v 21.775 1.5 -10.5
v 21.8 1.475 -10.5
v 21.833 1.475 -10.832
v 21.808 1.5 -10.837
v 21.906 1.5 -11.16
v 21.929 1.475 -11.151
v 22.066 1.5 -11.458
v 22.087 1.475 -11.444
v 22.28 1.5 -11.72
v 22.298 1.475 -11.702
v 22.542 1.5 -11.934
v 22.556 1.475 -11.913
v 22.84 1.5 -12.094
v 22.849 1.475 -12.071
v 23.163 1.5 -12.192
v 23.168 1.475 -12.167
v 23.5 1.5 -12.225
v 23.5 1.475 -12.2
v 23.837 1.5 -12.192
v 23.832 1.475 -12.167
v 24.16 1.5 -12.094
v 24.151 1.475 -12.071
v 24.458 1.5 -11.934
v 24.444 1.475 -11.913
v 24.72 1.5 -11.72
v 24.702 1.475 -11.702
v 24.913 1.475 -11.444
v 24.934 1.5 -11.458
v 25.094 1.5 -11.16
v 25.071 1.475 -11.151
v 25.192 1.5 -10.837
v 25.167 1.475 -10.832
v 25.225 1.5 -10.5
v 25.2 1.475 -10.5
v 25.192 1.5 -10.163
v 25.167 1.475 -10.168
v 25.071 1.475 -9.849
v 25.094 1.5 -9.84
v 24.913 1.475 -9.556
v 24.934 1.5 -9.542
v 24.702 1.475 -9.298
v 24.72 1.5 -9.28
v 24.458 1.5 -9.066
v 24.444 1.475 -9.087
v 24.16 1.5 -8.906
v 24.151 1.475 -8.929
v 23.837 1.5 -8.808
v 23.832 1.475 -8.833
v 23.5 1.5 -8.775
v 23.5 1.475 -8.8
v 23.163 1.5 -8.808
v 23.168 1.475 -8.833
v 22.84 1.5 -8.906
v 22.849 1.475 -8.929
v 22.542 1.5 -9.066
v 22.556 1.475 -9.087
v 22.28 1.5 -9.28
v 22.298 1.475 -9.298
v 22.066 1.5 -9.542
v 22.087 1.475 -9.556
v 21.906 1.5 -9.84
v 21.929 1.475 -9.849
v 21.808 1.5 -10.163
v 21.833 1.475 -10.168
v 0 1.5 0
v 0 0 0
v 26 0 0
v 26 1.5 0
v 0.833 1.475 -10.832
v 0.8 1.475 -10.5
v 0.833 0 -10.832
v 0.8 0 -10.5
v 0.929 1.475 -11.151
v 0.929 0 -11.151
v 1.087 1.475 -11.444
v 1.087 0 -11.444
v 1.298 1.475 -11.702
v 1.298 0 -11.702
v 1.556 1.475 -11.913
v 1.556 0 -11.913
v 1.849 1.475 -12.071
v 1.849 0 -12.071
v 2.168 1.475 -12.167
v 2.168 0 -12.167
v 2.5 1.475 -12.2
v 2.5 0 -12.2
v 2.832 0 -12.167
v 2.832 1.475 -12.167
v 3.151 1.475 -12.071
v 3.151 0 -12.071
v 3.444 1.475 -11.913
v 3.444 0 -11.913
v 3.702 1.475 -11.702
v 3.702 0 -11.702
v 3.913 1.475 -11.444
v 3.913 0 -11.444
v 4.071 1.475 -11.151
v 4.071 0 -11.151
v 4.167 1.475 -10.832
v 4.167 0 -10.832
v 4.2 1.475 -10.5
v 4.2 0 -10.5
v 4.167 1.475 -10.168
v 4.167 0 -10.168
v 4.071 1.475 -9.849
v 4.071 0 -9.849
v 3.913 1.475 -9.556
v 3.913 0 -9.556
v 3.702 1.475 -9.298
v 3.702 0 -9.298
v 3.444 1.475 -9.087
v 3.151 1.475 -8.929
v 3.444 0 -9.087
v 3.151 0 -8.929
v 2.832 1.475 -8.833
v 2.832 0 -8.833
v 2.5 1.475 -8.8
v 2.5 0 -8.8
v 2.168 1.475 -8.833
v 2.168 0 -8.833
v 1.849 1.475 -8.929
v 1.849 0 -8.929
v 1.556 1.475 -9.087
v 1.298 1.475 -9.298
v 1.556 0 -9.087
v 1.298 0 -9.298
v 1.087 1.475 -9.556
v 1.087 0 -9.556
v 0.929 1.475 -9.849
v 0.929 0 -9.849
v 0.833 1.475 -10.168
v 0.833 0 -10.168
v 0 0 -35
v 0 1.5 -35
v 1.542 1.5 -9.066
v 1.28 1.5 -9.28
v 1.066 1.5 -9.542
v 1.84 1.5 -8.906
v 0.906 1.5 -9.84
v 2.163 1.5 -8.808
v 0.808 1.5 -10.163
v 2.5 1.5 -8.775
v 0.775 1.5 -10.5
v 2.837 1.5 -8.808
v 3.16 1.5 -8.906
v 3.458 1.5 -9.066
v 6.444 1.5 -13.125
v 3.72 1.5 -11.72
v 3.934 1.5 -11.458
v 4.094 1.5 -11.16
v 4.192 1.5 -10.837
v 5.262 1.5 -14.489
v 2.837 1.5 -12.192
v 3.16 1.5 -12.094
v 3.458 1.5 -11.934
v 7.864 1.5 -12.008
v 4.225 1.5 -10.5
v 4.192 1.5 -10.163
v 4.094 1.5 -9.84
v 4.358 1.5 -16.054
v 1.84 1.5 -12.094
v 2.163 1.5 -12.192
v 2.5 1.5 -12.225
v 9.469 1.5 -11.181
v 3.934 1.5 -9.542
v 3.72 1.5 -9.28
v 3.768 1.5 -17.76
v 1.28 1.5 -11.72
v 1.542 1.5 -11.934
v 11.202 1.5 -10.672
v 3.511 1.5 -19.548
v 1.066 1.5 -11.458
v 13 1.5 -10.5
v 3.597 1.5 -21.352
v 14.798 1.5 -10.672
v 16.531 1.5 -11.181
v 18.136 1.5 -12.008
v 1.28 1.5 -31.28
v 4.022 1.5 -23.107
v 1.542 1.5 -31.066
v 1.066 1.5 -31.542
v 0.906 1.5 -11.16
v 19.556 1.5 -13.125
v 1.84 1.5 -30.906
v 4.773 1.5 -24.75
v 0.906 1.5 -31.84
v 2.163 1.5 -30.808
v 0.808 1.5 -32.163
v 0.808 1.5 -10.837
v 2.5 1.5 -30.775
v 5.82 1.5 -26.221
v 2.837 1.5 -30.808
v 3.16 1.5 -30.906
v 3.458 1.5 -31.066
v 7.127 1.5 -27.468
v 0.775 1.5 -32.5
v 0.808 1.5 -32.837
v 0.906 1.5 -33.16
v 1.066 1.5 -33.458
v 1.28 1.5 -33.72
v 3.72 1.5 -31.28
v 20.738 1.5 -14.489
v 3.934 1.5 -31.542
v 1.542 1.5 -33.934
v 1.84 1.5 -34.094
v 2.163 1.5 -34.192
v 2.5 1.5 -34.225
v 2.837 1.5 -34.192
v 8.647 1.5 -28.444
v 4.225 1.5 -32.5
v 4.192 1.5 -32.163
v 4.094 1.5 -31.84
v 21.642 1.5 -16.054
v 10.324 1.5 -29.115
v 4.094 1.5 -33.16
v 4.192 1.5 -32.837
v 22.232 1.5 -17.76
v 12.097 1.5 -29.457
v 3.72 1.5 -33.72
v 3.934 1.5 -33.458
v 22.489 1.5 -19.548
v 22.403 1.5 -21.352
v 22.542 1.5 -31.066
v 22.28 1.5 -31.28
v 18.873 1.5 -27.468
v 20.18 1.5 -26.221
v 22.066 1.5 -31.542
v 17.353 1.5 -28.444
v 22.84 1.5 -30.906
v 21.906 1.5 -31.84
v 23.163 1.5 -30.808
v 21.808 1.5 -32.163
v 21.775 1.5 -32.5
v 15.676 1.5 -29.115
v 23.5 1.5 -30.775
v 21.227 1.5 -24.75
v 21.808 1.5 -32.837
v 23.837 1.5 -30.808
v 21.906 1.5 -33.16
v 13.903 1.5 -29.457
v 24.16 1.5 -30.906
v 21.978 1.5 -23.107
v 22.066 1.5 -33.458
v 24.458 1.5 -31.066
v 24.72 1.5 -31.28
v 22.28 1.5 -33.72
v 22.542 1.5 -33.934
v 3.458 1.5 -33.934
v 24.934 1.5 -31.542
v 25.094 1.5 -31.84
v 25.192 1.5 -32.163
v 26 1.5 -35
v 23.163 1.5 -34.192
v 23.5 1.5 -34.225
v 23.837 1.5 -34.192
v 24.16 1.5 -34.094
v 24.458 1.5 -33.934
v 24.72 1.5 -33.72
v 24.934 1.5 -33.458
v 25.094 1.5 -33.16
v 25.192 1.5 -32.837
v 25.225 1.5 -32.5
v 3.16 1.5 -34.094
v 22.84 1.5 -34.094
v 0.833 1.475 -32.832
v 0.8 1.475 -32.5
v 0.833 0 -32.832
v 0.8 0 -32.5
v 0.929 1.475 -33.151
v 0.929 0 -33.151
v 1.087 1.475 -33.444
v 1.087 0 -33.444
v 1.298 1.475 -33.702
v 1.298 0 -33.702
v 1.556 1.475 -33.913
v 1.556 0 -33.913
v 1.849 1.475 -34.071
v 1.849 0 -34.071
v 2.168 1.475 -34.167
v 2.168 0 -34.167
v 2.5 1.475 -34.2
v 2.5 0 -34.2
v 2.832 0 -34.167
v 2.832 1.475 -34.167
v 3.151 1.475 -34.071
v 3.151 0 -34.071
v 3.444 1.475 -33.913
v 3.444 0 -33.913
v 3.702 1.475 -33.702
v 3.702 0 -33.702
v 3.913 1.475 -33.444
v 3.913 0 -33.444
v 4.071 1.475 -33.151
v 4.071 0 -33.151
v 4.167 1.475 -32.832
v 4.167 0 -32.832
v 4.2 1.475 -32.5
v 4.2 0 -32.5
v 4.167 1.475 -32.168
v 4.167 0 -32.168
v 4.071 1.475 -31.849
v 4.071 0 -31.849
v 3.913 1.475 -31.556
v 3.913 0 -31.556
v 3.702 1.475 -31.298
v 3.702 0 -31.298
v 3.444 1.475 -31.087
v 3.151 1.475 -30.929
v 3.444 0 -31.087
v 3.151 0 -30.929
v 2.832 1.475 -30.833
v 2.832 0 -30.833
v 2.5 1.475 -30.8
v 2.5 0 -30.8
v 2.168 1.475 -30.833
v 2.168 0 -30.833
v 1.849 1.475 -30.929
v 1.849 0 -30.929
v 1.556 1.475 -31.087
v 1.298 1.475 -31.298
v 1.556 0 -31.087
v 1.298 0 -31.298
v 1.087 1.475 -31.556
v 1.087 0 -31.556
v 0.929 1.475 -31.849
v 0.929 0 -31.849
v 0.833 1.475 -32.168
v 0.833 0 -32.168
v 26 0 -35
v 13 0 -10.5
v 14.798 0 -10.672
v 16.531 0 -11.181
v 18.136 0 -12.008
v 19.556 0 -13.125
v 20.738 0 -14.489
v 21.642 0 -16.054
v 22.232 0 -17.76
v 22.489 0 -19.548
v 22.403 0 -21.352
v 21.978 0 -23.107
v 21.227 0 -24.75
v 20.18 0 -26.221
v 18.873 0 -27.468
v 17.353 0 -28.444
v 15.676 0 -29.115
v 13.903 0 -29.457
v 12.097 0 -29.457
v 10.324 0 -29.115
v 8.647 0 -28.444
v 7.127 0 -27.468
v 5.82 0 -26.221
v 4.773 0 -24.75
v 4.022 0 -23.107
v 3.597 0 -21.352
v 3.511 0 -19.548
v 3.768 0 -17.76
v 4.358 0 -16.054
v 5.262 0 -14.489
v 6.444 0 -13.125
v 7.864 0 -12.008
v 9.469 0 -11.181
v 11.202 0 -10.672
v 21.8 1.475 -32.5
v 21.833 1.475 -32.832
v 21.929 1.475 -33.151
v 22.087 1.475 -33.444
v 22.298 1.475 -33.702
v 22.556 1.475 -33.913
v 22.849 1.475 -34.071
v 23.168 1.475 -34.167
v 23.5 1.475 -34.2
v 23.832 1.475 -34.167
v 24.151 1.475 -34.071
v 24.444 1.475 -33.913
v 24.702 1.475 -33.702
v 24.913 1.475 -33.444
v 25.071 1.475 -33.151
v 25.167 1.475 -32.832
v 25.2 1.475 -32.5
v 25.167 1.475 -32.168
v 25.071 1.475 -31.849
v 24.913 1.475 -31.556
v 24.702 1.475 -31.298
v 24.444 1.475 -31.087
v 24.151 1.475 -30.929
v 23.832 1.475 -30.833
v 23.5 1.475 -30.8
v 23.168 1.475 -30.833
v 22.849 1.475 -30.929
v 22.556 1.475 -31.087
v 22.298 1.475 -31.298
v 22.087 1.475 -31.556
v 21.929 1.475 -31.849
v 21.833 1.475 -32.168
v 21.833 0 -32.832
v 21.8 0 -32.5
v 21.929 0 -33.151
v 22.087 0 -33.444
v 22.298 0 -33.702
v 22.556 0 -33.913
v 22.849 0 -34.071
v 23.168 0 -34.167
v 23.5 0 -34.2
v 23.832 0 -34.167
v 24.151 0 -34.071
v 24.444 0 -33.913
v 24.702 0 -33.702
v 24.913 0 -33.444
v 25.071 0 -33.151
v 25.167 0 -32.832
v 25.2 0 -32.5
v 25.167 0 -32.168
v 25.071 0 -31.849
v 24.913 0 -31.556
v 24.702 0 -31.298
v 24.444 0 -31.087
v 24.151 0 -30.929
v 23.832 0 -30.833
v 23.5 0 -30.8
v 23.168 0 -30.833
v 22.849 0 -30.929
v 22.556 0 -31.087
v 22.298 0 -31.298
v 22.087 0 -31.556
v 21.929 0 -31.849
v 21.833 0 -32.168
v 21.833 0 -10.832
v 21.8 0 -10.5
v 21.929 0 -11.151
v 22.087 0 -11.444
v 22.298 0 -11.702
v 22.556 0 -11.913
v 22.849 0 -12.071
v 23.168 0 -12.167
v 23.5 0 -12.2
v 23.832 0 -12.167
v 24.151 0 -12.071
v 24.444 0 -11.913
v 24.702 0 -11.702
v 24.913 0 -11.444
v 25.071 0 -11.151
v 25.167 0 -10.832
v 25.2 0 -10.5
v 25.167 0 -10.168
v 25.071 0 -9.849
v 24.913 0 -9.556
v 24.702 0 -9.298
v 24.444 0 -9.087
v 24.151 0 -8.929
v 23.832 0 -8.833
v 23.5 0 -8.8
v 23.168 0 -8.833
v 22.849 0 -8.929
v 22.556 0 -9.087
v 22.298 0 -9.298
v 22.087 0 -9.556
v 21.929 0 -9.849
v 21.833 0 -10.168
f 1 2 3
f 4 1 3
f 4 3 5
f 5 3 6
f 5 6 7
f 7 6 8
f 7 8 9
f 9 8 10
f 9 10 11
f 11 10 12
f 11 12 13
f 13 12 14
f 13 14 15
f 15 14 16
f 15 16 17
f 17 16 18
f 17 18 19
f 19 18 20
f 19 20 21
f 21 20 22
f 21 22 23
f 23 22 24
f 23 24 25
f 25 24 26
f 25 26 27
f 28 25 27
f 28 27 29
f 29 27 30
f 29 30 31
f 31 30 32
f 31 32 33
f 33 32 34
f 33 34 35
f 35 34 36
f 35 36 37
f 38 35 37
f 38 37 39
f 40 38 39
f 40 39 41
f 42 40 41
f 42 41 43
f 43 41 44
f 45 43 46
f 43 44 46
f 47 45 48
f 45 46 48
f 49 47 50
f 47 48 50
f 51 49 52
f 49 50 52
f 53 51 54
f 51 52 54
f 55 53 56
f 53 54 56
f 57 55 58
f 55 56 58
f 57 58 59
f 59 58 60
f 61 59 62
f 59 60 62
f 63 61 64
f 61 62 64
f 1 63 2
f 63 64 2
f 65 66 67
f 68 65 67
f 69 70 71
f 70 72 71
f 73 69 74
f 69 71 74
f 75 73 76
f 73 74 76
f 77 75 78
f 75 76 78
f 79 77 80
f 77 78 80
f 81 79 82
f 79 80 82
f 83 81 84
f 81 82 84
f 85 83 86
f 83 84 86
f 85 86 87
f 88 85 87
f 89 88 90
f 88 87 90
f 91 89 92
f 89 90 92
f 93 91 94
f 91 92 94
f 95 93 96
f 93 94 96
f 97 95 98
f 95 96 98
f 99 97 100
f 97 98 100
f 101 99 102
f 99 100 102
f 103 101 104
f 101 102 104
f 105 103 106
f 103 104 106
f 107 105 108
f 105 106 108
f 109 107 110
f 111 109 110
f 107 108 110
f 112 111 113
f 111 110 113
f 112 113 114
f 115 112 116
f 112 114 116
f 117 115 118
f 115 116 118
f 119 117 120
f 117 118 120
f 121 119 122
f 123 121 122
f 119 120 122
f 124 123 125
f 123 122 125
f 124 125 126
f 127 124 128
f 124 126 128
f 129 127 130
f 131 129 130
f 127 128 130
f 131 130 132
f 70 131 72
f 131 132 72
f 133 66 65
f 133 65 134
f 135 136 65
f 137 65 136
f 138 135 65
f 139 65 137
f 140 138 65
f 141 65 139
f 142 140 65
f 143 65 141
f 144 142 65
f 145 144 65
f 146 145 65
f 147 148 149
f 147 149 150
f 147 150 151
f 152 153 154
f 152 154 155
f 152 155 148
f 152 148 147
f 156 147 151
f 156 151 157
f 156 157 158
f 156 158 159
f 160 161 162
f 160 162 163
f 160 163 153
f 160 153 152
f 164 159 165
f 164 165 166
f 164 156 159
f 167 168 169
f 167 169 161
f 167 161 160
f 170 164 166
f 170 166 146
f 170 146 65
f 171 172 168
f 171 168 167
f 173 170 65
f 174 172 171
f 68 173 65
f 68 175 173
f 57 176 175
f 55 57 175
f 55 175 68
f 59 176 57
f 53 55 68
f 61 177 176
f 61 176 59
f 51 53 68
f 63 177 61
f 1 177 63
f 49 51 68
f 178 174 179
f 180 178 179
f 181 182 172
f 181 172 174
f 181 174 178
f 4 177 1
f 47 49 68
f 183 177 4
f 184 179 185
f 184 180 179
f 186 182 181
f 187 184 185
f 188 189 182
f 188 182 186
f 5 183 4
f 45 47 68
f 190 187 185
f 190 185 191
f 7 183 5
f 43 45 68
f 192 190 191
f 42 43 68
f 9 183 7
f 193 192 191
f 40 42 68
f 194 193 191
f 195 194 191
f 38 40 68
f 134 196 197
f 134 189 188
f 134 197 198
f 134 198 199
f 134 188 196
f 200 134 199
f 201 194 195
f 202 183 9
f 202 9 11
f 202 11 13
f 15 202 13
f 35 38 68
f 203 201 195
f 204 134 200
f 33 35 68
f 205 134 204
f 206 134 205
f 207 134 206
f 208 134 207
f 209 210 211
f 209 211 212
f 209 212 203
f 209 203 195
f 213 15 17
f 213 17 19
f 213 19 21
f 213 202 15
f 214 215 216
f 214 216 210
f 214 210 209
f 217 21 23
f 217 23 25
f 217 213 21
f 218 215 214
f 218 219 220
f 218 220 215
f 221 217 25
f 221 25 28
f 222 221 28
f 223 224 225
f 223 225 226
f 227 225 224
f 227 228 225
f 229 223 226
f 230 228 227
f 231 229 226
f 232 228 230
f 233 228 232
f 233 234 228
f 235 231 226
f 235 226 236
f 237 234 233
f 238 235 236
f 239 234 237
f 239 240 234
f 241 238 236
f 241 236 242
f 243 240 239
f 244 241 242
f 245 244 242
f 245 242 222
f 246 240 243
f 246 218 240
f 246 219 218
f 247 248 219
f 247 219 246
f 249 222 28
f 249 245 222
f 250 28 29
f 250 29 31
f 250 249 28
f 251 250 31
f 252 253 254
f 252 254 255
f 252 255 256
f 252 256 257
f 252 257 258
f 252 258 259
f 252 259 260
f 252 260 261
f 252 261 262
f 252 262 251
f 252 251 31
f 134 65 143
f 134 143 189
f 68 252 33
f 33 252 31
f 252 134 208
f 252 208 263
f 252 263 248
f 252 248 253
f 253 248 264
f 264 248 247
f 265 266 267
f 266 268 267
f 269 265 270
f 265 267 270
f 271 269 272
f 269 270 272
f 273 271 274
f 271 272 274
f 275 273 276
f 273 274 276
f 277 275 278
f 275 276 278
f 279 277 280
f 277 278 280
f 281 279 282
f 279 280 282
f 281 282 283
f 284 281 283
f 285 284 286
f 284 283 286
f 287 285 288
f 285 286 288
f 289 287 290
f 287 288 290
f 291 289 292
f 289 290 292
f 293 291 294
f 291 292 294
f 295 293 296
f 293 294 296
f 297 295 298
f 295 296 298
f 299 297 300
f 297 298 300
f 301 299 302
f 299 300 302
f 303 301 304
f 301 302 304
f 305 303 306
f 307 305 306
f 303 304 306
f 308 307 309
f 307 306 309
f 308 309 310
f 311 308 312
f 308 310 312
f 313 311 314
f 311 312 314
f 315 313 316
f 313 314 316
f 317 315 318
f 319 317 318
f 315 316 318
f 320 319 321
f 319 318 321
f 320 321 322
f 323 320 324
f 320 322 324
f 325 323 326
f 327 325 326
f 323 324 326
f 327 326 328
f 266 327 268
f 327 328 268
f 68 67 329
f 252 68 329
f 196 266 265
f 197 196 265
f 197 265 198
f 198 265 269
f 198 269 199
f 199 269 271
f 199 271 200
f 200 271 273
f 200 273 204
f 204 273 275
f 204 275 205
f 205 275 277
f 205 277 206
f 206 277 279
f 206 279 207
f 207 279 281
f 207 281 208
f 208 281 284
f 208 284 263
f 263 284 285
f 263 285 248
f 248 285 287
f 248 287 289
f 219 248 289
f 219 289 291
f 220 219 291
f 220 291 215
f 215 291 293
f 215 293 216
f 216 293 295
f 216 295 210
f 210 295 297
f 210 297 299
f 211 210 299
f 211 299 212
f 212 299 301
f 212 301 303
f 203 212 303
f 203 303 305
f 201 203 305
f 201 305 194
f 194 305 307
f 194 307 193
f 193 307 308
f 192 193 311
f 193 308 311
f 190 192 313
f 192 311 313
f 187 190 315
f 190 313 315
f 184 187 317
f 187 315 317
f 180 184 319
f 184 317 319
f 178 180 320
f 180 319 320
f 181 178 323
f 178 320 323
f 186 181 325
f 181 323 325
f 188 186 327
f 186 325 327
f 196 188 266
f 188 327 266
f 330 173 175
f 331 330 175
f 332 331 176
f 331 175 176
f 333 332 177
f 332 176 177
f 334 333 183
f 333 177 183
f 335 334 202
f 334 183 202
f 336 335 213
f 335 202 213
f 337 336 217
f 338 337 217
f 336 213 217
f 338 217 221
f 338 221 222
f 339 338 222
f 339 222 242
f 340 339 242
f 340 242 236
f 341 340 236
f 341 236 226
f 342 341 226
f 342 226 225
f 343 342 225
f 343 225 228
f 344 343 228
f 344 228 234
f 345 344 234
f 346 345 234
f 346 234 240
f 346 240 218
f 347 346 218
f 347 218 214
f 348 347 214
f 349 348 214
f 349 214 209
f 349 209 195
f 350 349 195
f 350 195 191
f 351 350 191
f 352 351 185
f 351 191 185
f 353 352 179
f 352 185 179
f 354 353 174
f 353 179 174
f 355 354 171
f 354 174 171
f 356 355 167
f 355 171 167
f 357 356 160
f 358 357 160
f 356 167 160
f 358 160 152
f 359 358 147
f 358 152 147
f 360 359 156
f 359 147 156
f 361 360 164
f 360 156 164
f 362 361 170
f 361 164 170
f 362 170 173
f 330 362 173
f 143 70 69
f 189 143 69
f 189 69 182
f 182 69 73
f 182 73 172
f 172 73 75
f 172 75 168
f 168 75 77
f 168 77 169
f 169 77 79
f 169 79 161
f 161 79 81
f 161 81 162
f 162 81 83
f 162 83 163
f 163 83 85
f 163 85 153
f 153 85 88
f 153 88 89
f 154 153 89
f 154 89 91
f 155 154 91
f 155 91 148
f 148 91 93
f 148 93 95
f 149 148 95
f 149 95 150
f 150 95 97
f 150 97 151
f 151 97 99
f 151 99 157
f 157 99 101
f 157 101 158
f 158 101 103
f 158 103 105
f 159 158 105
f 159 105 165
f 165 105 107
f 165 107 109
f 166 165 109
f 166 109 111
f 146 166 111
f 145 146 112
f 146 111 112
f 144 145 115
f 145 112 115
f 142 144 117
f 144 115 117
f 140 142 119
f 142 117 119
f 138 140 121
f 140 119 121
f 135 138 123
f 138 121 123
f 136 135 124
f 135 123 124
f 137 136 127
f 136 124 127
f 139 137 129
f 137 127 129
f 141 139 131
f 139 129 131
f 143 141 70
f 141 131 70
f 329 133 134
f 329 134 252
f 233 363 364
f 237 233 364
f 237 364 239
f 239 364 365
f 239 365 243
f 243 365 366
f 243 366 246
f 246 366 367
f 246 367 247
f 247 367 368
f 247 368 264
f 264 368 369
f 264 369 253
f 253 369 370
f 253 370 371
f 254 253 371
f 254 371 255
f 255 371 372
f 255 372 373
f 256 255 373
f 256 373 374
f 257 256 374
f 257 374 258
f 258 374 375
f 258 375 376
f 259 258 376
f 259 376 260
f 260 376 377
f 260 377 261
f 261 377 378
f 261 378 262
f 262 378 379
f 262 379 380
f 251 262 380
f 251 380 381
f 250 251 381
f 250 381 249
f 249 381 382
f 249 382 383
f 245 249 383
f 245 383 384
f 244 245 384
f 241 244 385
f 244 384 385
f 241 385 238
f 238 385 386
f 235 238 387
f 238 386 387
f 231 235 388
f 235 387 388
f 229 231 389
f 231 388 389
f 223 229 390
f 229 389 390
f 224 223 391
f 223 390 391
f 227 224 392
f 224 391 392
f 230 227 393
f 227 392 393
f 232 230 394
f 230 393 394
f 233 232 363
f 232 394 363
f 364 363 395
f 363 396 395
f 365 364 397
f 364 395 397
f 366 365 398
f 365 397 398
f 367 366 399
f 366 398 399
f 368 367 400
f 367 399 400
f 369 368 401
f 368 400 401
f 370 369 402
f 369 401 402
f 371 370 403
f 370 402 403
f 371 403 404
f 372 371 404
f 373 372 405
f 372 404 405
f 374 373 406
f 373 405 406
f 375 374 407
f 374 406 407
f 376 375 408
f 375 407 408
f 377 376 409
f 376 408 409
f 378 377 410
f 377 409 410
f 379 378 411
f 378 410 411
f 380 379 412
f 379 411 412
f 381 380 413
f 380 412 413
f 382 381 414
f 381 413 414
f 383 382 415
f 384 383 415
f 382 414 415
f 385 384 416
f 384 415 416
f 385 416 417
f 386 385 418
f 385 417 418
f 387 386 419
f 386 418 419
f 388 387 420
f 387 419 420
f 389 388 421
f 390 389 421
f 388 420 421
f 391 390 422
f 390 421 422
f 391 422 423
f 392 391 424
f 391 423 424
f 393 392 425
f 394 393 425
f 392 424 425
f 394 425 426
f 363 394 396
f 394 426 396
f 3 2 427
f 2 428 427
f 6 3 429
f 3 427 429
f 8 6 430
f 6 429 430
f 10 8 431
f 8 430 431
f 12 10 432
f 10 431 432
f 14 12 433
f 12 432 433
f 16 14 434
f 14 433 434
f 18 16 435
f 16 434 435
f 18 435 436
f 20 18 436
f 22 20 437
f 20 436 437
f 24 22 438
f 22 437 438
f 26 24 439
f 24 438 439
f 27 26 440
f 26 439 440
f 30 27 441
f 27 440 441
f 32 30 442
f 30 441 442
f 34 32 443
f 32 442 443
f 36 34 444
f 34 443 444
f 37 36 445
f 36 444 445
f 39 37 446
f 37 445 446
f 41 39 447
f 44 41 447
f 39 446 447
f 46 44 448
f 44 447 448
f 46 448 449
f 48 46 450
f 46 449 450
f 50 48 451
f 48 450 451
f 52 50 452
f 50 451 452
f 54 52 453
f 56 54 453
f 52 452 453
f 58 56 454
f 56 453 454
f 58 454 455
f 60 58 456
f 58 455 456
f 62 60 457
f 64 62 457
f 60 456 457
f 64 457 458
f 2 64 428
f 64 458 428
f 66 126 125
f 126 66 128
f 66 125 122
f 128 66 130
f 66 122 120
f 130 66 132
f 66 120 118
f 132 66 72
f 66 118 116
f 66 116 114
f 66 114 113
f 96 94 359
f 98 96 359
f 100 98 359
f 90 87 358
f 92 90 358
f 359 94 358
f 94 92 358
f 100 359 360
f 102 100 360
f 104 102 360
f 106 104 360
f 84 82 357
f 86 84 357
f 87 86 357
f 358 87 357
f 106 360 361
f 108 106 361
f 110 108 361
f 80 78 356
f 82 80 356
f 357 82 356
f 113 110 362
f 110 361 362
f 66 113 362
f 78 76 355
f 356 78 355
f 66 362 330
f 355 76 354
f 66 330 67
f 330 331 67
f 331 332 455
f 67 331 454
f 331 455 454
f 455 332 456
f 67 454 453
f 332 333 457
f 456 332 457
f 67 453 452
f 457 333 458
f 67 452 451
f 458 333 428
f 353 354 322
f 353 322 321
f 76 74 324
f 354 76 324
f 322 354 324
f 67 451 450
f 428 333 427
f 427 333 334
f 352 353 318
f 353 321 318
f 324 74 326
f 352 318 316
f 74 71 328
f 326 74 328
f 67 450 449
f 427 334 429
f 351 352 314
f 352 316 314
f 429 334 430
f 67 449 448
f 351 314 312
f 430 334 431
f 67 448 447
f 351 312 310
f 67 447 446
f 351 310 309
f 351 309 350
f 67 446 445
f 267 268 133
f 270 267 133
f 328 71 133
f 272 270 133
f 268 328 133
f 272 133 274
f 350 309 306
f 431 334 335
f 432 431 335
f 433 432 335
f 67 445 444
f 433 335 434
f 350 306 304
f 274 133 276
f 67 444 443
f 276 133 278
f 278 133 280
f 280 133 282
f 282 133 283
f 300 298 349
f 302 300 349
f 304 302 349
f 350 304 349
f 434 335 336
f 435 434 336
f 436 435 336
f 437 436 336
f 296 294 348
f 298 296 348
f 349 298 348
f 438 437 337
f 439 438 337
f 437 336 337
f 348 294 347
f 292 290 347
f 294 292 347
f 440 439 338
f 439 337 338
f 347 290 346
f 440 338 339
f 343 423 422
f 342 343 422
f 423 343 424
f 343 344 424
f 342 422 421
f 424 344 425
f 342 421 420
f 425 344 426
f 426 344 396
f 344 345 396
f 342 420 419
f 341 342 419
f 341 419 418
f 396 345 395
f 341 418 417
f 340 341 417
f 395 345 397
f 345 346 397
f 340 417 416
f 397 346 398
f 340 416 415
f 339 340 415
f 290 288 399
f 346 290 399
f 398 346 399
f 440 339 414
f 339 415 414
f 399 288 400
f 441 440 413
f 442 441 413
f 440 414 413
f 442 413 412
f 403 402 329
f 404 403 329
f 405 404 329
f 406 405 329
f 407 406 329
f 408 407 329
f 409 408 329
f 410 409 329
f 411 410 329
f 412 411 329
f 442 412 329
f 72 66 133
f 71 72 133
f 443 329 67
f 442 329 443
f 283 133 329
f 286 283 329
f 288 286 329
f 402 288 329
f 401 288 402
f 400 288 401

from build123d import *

# Parameters (mm, degrees)
SKETCH1_W                      = 26
SKETCH1_H                      = 35
BOSS_EXTRUDE1_DEPTH            = 1.5
M3_CLEARANCE_HOLE1_D           = 3.4
M3_CLEARANCE_HOLE1_DEPTH       = 3
M3_CLEARANCE_HOLE1_CSINK_D     = 3.45
M3_CLEARANCE_HOLE1_CSINK_ANGLE = 90
SKETCH4_R                      = 9.5
CUT_EXTRUDE1_DEPTH             = 44.626253564


with BuildPart() as part:
    # Sketch1 → Boss-Extrude1 (new body)
    with BuildSketch(Plane(origin=(0, 0, 0), x_dir=(1, 0, 0), z_dir=(0, 1, 0))):
        with Locations((13, 17.5)):
            Rectangle(SKETCH1_W, SKETCH1_H)
    extrude(amount=BOSS_EXTRUDE1_DEPTH)

    # M3 Clearance Hole1
    with Locations(Plane(origin=(0, 1.5, 0), x_dir=(1, 0, 0), z_dir=(0, 1, 0))):
        with Locations((2.5, 32.5), (2.5, 10.5), (23.5, 10.5), (23.5, 32.5)):
            CounterSinkHole(M3_CLEARANCE_HOLE1_D / 2, M3_CLEARANCE_HOLE1_CSINK_D / 2, depth=M3_CLEARANCE_HOLE1_DEPTH, counter_sink_angle=M3_CLEARANCE_HOLE1_CSINK_ANGLE)

    # Sketch4 → Cut-Extrude1 (cut, through all)
    with BuildSketch(Plane(origin=(0, 1.5, 0), x_dir=(1, 0, 0), z_dir=(0, 1, 0))):
        with Locations(Location((13, 20, 0), (0, 0, 270))):
            Circle(SKETCH4_R)
    extrude(amount=-CUT_EXTRUDE1_DEPTH, mode=Mode.SUBTRACT)


solid = part.part
